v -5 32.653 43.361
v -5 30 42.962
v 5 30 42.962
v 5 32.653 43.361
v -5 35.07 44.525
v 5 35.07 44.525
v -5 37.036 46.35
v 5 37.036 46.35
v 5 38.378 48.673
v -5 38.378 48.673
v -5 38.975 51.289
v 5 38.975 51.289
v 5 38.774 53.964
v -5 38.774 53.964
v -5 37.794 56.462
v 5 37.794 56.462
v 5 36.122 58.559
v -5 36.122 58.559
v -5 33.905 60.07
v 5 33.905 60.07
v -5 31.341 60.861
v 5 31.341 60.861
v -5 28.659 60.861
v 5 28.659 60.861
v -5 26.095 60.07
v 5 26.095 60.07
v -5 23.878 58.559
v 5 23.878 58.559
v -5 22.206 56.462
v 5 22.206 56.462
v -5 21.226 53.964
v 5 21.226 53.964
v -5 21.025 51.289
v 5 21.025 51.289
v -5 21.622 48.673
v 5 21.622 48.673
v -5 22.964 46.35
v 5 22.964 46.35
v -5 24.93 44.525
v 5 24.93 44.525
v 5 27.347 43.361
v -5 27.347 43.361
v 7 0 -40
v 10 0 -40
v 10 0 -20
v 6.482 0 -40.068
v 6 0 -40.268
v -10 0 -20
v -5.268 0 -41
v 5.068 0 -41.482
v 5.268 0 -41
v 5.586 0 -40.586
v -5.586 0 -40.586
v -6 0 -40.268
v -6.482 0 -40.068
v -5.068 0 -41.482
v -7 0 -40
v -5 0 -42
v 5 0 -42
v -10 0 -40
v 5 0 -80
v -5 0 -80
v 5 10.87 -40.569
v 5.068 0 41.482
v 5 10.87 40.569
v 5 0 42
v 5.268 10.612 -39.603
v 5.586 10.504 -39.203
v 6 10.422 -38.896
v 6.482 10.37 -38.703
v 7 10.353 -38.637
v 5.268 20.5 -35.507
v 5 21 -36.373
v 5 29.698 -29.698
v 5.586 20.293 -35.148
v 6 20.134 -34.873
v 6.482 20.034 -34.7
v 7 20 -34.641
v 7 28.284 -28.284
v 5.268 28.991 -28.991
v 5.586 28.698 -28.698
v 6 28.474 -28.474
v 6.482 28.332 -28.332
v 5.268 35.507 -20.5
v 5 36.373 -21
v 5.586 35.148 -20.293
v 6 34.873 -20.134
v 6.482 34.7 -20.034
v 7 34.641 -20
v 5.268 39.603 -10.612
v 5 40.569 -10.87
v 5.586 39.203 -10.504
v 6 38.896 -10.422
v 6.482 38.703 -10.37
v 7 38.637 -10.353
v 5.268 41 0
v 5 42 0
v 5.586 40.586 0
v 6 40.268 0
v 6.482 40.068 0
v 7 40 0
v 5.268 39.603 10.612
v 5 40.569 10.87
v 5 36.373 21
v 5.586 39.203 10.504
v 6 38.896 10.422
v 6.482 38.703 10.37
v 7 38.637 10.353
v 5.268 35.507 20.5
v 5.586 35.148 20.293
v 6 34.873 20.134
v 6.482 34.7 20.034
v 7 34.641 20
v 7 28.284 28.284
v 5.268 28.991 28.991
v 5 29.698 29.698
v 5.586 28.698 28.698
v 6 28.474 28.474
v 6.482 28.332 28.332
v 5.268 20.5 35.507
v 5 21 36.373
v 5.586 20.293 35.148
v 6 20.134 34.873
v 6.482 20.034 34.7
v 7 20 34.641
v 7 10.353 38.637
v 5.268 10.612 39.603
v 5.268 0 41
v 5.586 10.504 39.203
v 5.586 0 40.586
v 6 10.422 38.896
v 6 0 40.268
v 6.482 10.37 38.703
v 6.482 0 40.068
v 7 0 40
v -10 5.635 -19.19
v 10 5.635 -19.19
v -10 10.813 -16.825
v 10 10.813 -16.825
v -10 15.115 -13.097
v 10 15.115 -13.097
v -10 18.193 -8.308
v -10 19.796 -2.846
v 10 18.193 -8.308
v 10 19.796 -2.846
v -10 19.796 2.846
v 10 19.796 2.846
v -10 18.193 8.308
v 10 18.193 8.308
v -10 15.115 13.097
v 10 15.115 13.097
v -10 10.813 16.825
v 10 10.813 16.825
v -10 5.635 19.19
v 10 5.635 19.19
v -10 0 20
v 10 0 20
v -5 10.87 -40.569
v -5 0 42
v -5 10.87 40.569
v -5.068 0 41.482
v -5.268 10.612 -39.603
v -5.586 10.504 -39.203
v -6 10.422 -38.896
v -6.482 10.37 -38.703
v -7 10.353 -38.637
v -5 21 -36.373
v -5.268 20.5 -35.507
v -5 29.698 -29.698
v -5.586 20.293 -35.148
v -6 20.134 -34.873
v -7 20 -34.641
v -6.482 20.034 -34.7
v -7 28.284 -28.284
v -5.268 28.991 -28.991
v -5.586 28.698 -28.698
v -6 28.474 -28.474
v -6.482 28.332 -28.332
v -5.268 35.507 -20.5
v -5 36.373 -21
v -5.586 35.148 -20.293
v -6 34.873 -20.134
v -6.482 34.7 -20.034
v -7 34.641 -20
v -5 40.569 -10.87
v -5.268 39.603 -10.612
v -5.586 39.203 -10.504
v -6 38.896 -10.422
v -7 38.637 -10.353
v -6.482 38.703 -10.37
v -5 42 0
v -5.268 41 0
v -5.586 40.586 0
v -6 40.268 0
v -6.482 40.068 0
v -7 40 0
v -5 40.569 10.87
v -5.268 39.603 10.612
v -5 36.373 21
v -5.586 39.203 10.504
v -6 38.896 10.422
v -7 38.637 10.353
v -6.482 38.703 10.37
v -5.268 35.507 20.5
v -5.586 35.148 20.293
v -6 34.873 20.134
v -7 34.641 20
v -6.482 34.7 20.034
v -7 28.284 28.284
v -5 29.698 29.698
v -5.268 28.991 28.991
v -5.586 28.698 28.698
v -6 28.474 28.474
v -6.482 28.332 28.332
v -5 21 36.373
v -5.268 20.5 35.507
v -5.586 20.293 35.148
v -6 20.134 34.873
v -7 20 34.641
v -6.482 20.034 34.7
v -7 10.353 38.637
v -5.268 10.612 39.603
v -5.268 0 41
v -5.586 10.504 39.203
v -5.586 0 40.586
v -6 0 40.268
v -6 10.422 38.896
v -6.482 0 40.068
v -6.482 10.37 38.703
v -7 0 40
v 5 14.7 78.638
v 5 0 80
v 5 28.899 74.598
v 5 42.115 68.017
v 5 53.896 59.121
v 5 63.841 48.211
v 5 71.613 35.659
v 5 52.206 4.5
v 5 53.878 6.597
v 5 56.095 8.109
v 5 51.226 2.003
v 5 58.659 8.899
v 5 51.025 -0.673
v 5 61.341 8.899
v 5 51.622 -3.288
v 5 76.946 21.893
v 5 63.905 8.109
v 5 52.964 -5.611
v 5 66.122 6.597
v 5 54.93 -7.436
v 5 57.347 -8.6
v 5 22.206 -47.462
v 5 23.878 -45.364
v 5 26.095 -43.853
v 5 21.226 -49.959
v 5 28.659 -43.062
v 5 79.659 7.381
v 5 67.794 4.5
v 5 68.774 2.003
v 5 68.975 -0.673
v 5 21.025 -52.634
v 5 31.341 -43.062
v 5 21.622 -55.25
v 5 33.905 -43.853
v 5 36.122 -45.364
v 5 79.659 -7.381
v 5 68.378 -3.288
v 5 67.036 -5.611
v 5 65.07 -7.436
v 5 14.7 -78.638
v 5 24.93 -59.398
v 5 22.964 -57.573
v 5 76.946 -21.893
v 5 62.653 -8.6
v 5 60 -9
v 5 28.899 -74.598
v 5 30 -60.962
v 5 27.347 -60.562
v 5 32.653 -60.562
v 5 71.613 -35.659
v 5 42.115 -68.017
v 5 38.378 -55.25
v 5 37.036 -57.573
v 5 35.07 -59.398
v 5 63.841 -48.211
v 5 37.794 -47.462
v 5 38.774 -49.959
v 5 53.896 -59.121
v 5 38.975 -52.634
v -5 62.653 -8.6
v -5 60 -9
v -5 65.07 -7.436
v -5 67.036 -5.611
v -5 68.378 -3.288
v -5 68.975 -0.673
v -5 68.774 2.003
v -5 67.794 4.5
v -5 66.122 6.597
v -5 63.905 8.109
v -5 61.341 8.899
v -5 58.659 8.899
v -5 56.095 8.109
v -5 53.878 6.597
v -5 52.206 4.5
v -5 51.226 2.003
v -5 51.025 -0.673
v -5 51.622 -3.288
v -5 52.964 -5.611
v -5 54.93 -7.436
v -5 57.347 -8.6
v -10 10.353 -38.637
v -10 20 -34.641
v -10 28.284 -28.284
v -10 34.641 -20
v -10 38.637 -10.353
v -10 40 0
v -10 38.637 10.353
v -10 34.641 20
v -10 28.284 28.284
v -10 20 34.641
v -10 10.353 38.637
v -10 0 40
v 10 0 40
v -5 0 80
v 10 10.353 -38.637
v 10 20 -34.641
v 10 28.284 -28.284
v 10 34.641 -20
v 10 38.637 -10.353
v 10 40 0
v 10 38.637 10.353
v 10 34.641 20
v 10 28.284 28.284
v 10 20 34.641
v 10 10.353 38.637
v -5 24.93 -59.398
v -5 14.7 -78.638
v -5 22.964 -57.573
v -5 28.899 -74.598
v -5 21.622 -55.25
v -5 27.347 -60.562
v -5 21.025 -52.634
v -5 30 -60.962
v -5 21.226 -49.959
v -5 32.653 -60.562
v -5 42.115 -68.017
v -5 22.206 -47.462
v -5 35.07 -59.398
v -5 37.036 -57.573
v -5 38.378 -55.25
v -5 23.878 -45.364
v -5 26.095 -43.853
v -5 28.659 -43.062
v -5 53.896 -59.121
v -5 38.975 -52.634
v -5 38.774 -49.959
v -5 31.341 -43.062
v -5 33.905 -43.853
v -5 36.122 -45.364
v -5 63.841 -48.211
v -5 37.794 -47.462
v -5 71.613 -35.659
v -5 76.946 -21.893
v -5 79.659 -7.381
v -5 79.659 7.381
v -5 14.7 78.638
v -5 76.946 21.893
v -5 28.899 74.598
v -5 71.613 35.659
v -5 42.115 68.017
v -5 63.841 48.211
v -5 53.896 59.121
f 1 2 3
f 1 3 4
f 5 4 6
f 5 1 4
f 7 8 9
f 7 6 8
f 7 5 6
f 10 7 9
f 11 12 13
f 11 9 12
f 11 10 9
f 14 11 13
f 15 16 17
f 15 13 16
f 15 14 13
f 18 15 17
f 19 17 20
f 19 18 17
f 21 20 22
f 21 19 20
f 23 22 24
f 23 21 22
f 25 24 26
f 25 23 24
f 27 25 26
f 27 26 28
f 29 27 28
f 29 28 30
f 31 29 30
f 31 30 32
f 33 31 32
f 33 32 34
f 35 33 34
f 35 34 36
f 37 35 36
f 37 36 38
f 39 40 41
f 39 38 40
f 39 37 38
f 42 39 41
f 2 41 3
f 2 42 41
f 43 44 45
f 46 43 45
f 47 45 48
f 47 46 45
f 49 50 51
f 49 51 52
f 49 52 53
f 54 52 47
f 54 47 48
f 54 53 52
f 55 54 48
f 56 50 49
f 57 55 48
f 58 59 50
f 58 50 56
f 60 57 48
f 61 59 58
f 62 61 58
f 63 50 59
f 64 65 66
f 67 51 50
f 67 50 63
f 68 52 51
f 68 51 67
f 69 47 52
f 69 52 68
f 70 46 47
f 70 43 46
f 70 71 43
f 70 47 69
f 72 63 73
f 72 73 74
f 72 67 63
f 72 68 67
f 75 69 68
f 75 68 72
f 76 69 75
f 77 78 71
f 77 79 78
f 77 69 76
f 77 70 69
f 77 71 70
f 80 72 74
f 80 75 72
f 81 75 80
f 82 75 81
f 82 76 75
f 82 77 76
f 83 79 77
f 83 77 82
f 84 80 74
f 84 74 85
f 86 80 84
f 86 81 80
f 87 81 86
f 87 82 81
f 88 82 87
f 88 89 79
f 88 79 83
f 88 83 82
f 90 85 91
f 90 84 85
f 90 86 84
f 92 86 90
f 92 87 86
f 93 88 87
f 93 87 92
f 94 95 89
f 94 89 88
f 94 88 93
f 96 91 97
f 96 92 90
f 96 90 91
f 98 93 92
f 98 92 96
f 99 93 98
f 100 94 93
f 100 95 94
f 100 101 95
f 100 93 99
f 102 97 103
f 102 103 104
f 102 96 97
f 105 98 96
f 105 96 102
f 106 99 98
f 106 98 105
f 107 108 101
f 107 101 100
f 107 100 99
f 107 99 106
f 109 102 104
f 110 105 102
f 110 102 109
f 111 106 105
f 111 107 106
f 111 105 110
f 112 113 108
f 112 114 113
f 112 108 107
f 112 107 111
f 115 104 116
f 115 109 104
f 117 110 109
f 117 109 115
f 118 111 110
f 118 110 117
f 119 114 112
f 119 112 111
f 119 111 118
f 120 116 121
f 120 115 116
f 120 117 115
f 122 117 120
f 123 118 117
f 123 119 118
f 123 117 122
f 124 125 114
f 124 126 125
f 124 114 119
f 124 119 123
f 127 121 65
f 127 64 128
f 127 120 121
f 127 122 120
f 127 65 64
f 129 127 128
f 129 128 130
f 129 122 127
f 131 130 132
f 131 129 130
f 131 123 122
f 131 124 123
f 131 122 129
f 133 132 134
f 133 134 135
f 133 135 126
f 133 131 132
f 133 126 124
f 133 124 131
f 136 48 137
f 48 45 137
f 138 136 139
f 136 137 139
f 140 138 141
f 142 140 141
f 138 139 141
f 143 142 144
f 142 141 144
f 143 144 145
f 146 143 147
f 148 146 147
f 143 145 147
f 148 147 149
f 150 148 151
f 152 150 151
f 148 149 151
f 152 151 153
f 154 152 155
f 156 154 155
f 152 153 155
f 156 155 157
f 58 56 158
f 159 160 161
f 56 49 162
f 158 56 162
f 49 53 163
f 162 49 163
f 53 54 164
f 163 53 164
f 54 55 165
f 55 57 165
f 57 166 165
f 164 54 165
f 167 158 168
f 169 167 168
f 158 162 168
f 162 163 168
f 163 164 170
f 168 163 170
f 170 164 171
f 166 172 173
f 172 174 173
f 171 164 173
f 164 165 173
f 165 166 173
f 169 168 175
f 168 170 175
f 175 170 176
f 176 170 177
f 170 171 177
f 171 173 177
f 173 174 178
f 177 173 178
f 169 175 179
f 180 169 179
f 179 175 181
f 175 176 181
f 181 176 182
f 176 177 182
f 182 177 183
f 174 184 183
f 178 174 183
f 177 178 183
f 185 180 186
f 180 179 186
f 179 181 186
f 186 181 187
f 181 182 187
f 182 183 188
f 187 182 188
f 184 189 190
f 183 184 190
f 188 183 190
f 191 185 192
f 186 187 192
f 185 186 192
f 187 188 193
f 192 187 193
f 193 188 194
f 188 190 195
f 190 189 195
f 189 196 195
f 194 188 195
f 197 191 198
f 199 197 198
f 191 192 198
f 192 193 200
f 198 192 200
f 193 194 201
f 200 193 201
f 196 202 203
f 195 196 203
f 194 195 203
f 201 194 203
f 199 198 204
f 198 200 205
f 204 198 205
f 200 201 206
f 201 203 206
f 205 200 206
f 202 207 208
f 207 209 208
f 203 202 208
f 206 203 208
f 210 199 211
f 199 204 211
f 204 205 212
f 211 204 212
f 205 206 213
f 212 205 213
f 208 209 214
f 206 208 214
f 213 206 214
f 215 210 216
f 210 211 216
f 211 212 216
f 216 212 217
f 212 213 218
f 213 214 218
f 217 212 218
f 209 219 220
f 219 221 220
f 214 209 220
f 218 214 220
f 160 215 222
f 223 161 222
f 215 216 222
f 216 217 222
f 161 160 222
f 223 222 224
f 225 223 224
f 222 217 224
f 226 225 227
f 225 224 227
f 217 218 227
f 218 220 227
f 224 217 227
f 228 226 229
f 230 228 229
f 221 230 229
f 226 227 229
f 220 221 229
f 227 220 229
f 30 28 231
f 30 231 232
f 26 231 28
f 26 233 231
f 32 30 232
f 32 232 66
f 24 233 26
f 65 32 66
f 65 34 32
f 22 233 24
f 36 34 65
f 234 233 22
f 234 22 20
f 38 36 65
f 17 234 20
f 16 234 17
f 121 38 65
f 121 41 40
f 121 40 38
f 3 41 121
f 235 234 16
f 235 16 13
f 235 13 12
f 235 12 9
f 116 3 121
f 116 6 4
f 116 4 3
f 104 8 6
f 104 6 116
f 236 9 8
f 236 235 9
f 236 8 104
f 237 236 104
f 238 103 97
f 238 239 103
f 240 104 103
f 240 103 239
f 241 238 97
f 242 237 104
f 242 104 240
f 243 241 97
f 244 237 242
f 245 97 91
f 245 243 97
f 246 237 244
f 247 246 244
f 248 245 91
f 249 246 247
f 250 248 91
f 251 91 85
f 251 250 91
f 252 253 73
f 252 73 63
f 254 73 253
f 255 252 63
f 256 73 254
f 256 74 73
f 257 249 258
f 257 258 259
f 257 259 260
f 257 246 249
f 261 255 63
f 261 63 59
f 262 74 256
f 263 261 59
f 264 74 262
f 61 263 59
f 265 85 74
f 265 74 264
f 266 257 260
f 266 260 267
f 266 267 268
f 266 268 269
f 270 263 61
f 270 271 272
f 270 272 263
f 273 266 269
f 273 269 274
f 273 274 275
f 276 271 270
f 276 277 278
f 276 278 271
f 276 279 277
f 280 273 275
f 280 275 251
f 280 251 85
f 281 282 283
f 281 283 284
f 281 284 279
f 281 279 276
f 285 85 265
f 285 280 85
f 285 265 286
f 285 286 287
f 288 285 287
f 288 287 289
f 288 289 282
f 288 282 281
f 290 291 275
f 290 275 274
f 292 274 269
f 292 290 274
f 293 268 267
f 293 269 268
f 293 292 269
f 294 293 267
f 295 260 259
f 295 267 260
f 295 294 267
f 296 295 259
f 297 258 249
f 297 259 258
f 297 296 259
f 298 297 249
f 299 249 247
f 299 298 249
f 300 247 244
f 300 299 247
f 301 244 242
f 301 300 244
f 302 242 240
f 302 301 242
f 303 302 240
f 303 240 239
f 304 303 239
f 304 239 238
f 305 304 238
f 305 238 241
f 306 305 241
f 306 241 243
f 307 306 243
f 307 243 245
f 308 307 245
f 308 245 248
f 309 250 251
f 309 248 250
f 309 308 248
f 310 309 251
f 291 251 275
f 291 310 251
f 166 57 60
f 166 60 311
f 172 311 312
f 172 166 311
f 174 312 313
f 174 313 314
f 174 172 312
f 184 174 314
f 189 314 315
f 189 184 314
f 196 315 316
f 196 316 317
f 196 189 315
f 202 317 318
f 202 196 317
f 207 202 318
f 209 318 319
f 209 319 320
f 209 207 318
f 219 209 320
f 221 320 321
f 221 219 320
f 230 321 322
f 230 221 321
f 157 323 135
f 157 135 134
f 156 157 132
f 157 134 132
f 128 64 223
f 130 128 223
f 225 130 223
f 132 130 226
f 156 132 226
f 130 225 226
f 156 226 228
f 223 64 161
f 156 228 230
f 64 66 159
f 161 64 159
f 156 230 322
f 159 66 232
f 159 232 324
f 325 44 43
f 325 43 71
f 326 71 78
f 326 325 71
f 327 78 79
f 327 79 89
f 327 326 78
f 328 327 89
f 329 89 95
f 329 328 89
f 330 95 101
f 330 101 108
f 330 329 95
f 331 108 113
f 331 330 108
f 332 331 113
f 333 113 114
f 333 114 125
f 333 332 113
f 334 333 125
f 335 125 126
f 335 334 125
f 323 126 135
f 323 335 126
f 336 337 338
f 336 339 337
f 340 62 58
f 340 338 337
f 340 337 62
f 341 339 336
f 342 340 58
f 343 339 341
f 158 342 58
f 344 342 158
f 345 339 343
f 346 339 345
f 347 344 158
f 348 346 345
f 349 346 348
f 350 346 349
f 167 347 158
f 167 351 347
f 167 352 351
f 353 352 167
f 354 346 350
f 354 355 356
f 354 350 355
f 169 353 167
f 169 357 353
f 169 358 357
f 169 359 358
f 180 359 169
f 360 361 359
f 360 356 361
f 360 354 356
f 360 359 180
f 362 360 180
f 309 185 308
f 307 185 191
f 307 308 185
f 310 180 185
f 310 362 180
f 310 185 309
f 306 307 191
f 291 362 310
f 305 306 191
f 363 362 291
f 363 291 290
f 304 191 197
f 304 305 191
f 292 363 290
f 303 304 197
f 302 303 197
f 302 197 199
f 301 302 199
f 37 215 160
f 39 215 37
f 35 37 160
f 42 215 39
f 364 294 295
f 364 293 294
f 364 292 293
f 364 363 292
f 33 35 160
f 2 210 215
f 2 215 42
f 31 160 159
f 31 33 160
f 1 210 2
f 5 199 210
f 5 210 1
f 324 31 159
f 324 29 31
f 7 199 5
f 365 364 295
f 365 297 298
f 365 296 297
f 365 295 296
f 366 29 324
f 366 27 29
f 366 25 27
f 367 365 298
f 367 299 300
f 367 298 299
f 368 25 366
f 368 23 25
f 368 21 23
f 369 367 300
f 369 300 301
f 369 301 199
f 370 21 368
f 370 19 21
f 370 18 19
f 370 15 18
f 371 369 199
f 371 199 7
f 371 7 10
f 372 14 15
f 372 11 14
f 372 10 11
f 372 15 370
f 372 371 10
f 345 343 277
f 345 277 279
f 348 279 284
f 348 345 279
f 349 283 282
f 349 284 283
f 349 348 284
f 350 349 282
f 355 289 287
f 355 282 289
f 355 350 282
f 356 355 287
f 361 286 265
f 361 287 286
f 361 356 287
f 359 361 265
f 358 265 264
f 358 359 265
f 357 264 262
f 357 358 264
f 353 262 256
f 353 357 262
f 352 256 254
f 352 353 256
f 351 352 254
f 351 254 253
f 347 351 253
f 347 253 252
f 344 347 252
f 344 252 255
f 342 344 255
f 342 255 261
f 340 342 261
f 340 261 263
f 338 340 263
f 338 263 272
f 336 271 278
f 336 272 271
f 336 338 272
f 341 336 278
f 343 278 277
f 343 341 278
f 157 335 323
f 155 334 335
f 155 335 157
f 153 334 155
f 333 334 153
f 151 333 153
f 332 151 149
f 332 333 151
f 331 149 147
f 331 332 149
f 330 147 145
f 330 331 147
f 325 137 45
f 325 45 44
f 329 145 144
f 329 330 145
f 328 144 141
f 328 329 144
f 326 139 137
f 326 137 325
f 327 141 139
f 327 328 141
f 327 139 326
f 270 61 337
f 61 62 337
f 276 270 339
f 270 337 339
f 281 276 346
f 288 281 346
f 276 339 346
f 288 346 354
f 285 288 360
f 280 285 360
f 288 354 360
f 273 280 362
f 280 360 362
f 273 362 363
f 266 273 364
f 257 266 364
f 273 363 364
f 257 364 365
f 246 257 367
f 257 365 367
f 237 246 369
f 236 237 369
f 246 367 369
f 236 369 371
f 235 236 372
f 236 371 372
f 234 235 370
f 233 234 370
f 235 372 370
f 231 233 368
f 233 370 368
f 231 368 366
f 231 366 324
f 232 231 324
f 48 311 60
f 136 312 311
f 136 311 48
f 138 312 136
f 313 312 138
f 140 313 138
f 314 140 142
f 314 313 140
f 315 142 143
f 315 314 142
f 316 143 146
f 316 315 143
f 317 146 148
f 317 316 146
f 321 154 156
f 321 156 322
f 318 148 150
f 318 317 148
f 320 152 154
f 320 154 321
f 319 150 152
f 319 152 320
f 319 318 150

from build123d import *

# Parameters (mm, degrees)
REVOLVE1_ANGLE          = 180
CUT_EXTRUDE1_DEPTH      = 114.578166916
CUT_EXTRUDE1_DEPTH_BACK = 114.578166916
SKETCH3_R               = 9
FILLET1_R               = 2


with BuildPart() as part:
    # Sketch2 → Revolve1 (revolve)
    with BuildSketch(Plane(origin=(0, 0, 0), x_dir=(1, 0, 0), z_dir=(0, 1, 0))):
        Polygon((-5, 80), (0, 80), (0, 20), (-10, 20), (-10, 40), (-5, 40), align=None)
        Polygon((10, 20), (0, 20), (0, 80), (5, 80), (5, 40), (10, 40), align=None)
    revolve(axis=Axis((-0.5, 0, 0), (1, 0, 0)), revolution_arc=REVOLVE1_ANGLE)

    # Sketch3 → Cut-Extrude1 (cut, two sides: drawn at the far end of the back side and taken through both)
    with BuildSketch(Plane(origin=(0, 0, 0), x_dir=(0, 0, -1), z_dir=(1, 0, 0)).offset(-CUT_EXTRUDE1_DEPTH_BACK)):
        with Locations((-51.961524227, 30)):
            Circle(SKETCH3_R)
        with Locations((0, 60)):
            Circle(SKETCH3_R)
        with Locations((51.961524227, 30)):
            Circle(SKETCH3_R)
    extrude(amount=CUT_EXTRUDE1_DEPTH + CUT_EXTRUDE1_DEPTH_BACK, mode=Mode.SUBTRACT)

    # Fillet1
    fillet1_edges = [part.edges().sort_by_distance(p)[0] for p in [
        (5, 40, 0),
        (-5, 40, 0),
    ]]
    fillet(fillet1_edges, radius=FILLET1_R)


solid = part.part
